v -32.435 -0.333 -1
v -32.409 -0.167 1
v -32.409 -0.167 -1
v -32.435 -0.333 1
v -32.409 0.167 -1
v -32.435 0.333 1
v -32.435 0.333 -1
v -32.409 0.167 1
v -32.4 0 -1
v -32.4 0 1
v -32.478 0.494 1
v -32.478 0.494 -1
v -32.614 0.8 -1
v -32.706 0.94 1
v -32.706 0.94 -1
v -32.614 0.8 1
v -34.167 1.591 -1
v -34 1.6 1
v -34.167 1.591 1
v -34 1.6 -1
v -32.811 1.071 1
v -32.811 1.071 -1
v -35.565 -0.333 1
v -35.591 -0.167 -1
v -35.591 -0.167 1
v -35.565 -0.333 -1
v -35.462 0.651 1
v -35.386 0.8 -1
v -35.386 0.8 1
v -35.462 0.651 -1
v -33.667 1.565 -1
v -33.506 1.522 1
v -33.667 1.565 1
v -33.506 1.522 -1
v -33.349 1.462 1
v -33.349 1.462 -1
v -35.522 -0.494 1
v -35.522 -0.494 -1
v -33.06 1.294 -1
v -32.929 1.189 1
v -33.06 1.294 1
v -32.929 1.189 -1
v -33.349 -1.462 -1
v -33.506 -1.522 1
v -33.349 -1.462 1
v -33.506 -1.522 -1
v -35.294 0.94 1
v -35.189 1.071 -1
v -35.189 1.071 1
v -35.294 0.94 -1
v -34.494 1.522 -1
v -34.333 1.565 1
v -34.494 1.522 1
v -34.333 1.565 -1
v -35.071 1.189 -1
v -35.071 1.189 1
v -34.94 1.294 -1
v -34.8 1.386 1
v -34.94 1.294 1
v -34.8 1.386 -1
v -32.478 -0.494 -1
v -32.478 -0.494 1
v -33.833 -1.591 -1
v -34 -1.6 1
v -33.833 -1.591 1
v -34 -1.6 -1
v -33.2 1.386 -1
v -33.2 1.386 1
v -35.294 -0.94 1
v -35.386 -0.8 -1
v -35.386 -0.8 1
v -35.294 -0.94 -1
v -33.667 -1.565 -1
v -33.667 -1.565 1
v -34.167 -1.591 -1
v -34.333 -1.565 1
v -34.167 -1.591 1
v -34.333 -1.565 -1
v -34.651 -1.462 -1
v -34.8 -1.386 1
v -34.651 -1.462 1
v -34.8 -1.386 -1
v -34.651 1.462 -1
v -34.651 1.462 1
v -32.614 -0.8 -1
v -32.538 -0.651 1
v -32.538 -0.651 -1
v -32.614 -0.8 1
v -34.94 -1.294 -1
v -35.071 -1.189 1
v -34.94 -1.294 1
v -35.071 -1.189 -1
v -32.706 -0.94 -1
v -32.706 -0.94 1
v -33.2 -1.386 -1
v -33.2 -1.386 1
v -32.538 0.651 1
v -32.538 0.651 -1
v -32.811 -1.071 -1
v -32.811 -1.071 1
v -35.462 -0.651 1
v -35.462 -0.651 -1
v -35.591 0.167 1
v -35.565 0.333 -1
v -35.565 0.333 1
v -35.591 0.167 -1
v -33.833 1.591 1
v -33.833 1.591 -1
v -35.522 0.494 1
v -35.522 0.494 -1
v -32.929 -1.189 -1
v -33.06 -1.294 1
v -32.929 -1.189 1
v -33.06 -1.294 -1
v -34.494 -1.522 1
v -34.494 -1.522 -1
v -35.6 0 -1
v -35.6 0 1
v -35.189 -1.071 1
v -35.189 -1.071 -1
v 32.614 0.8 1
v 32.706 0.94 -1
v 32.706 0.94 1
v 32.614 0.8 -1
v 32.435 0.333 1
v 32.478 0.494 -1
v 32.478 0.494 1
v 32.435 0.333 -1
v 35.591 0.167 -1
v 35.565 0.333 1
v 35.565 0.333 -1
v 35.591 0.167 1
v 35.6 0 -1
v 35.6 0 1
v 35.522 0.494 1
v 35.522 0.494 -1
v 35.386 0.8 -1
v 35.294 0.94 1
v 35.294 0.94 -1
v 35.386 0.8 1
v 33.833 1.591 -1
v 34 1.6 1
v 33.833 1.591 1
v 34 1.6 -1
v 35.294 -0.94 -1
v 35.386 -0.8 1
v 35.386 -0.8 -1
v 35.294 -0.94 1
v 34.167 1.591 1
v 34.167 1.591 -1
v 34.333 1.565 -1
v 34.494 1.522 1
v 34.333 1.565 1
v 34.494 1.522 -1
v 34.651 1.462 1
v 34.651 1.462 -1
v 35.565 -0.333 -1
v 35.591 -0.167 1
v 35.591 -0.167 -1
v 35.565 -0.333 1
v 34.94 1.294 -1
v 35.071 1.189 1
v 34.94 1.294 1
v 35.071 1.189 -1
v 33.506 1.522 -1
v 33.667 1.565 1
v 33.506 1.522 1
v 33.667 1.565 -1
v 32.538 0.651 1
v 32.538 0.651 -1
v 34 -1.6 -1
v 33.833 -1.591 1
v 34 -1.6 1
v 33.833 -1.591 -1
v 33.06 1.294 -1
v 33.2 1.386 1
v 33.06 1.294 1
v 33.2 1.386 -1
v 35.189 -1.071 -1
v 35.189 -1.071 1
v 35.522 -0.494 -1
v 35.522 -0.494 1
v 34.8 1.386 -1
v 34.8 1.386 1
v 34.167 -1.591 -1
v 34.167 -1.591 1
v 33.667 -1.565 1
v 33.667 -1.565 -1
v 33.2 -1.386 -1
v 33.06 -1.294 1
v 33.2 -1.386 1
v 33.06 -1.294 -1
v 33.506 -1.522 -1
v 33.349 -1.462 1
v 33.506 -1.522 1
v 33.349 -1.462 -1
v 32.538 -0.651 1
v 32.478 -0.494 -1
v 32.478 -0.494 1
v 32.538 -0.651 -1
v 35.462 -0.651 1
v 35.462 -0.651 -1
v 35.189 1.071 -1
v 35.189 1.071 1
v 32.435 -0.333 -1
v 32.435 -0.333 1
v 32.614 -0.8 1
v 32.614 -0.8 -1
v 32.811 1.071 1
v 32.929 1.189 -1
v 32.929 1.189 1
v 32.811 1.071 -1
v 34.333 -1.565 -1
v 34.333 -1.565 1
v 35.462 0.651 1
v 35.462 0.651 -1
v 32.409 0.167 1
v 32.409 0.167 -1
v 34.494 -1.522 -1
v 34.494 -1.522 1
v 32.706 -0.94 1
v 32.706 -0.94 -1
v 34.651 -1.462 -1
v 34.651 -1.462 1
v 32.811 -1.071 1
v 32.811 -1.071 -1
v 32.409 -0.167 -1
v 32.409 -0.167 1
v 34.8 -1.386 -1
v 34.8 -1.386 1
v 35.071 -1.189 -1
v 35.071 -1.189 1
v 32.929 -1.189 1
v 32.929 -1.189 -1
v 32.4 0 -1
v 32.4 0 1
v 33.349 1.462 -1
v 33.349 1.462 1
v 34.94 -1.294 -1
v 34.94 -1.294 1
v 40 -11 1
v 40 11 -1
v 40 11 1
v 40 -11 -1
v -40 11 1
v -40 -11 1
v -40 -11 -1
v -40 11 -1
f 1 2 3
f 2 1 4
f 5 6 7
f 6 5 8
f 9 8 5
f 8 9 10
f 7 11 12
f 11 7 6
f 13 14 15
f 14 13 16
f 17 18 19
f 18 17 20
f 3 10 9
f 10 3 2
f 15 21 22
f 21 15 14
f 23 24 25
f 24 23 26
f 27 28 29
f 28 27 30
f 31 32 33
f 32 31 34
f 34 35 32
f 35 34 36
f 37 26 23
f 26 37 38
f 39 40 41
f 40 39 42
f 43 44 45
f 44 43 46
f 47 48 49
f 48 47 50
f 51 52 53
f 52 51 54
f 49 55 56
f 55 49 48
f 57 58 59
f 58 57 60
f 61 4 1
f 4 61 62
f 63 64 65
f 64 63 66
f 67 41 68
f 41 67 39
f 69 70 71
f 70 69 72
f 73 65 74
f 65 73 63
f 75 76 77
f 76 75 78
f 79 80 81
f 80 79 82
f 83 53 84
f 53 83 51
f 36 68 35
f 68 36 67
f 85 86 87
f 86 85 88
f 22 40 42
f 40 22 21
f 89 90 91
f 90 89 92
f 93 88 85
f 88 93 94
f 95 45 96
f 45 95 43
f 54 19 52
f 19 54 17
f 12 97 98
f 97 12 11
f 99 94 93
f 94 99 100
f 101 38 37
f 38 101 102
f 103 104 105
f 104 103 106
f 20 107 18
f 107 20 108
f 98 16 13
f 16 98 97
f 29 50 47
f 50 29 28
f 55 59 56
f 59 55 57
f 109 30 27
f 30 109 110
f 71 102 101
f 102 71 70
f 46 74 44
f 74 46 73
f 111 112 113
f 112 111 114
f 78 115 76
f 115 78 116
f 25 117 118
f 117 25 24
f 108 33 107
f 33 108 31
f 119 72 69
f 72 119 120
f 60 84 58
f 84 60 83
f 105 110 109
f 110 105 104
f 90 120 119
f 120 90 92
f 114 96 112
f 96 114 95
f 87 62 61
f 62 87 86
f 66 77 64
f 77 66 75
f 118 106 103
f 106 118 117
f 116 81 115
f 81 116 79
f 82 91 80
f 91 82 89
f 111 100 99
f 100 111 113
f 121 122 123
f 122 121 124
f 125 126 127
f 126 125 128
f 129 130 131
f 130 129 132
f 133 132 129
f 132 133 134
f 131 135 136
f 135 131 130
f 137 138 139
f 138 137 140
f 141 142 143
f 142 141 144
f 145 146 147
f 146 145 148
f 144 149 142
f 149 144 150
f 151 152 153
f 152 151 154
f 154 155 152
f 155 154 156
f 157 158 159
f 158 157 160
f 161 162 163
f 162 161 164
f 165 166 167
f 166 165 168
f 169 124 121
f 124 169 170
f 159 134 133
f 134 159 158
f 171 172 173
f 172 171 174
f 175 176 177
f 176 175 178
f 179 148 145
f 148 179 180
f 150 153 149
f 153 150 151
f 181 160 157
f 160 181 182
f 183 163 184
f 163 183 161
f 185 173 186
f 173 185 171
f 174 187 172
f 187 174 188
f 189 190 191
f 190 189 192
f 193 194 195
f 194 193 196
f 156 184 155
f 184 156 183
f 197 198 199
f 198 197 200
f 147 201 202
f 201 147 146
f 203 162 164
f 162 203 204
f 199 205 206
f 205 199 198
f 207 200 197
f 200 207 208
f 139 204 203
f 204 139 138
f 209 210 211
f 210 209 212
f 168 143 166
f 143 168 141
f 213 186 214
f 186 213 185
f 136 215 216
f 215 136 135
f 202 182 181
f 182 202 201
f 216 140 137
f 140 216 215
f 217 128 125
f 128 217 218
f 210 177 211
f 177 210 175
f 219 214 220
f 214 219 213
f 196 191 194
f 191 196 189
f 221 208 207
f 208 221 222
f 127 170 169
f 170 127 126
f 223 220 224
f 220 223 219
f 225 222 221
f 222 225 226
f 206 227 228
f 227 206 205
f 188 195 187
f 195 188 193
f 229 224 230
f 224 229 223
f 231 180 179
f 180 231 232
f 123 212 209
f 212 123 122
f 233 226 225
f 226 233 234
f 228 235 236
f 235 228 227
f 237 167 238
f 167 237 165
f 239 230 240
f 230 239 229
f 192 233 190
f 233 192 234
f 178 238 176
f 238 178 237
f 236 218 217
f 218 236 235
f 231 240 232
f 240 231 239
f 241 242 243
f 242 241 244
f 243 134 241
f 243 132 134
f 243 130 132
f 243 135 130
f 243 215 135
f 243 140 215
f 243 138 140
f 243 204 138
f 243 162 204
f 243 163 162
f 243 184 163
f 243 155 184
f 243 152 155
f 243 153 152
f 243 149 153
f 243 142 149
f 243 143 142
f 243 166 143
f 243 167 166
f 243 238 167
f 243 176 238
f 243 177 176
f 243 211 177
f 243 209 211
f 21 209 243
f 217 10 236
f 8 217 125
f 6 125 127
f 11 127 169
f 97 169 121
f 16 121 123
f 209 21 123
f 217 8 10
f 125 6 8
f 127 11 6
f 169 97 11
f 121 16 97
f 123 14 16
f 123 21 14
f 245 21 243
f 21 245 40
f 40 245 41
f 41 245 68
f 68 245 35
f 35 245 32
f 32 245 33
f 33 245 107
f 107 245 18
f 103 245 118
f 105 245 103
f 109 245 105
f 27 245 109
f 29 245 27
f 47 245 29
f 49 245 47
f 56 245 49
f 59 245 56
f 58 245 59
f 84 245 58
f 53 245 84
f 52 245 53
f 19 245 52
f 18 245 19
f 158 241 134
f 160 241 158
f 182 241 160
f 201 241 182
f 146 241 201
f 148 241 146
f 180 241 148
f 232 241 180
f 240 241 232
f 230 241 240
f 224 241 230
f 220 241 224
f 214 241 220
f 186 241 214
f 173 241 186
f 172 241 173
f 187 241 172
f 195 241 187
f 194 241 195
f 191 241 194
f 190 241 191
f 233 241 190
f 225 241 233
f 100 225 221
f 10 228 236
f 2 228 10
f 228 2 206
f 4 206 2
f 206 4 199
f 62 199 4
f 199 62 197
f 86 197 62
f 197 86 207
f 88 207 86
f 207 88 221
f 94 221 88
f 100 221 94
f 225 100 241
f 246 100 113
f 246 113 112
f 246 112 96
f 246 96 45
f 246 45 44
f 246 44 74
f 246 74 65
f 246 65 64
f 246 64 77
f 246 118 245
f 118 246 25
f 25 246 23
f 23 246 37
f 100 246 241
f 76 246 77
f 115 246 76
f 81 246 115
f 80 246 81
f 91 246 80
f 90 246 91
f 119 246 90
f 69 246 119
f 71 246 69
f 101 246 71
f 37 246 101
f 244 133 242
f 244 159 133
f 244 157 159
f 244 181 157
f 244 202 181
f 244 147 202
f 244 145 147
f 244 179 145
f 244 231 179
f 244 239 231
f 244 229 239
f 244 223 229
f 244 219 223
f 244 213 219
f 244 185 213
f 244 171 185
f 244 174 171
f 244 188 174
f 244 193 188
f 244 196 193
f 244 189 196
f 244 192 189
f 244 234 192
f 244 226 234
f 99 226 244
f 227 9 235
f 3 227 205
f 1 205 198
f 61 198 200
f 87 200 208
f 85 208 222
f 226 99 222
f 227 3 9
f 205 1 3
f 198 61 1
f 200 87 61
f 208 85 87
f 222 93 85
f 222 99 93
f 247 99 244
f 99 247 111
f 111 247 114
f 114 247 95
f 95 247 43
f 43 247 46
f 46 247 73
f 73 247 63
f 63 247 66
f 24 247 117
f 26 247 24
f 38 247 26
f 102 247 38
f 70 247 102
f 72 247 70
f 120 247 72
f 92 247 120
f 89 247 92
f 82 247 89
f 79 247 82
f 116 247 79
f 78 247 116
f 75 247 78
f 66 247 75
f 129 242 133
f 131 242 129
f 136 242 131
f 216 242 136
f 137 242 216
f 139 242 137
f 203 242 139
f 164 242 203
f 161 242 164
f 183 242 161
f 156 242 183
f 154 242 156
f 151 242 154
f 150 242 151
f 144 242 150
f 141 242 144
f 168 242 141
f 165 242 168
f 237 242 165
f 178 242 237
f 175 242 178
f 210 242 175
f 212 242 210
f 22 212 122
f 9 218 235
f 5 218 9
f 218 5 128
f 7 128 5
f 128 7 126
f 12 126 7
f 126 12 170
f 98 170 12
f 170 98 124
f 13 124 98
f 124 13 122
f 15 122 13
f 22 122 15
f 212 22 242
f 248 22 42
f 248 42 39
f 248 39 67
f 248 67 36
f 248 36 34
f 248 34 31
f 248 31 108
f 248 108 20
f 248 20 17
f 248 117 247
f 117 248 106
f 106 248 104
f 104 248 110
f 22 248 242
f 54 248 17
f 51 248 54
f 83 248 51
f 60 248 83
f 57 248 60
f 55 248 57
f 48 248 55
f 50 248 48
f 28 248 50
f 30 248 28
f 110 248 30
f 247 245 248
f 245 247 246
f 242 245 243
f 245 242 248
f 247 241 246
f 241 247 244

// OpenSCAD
// Engraving-ready nameplate.
$fn = 60;
eps = 0.02;
length = 80;
width = 22;
thickness = 2;
difference() { cube([length,width,thickness],center=true); for(x=[-length/2+6,length/2-6]) translate([x,0,-thickness/2-eps]) cylinder(d=3.2,h=thickness+2*eps); }
